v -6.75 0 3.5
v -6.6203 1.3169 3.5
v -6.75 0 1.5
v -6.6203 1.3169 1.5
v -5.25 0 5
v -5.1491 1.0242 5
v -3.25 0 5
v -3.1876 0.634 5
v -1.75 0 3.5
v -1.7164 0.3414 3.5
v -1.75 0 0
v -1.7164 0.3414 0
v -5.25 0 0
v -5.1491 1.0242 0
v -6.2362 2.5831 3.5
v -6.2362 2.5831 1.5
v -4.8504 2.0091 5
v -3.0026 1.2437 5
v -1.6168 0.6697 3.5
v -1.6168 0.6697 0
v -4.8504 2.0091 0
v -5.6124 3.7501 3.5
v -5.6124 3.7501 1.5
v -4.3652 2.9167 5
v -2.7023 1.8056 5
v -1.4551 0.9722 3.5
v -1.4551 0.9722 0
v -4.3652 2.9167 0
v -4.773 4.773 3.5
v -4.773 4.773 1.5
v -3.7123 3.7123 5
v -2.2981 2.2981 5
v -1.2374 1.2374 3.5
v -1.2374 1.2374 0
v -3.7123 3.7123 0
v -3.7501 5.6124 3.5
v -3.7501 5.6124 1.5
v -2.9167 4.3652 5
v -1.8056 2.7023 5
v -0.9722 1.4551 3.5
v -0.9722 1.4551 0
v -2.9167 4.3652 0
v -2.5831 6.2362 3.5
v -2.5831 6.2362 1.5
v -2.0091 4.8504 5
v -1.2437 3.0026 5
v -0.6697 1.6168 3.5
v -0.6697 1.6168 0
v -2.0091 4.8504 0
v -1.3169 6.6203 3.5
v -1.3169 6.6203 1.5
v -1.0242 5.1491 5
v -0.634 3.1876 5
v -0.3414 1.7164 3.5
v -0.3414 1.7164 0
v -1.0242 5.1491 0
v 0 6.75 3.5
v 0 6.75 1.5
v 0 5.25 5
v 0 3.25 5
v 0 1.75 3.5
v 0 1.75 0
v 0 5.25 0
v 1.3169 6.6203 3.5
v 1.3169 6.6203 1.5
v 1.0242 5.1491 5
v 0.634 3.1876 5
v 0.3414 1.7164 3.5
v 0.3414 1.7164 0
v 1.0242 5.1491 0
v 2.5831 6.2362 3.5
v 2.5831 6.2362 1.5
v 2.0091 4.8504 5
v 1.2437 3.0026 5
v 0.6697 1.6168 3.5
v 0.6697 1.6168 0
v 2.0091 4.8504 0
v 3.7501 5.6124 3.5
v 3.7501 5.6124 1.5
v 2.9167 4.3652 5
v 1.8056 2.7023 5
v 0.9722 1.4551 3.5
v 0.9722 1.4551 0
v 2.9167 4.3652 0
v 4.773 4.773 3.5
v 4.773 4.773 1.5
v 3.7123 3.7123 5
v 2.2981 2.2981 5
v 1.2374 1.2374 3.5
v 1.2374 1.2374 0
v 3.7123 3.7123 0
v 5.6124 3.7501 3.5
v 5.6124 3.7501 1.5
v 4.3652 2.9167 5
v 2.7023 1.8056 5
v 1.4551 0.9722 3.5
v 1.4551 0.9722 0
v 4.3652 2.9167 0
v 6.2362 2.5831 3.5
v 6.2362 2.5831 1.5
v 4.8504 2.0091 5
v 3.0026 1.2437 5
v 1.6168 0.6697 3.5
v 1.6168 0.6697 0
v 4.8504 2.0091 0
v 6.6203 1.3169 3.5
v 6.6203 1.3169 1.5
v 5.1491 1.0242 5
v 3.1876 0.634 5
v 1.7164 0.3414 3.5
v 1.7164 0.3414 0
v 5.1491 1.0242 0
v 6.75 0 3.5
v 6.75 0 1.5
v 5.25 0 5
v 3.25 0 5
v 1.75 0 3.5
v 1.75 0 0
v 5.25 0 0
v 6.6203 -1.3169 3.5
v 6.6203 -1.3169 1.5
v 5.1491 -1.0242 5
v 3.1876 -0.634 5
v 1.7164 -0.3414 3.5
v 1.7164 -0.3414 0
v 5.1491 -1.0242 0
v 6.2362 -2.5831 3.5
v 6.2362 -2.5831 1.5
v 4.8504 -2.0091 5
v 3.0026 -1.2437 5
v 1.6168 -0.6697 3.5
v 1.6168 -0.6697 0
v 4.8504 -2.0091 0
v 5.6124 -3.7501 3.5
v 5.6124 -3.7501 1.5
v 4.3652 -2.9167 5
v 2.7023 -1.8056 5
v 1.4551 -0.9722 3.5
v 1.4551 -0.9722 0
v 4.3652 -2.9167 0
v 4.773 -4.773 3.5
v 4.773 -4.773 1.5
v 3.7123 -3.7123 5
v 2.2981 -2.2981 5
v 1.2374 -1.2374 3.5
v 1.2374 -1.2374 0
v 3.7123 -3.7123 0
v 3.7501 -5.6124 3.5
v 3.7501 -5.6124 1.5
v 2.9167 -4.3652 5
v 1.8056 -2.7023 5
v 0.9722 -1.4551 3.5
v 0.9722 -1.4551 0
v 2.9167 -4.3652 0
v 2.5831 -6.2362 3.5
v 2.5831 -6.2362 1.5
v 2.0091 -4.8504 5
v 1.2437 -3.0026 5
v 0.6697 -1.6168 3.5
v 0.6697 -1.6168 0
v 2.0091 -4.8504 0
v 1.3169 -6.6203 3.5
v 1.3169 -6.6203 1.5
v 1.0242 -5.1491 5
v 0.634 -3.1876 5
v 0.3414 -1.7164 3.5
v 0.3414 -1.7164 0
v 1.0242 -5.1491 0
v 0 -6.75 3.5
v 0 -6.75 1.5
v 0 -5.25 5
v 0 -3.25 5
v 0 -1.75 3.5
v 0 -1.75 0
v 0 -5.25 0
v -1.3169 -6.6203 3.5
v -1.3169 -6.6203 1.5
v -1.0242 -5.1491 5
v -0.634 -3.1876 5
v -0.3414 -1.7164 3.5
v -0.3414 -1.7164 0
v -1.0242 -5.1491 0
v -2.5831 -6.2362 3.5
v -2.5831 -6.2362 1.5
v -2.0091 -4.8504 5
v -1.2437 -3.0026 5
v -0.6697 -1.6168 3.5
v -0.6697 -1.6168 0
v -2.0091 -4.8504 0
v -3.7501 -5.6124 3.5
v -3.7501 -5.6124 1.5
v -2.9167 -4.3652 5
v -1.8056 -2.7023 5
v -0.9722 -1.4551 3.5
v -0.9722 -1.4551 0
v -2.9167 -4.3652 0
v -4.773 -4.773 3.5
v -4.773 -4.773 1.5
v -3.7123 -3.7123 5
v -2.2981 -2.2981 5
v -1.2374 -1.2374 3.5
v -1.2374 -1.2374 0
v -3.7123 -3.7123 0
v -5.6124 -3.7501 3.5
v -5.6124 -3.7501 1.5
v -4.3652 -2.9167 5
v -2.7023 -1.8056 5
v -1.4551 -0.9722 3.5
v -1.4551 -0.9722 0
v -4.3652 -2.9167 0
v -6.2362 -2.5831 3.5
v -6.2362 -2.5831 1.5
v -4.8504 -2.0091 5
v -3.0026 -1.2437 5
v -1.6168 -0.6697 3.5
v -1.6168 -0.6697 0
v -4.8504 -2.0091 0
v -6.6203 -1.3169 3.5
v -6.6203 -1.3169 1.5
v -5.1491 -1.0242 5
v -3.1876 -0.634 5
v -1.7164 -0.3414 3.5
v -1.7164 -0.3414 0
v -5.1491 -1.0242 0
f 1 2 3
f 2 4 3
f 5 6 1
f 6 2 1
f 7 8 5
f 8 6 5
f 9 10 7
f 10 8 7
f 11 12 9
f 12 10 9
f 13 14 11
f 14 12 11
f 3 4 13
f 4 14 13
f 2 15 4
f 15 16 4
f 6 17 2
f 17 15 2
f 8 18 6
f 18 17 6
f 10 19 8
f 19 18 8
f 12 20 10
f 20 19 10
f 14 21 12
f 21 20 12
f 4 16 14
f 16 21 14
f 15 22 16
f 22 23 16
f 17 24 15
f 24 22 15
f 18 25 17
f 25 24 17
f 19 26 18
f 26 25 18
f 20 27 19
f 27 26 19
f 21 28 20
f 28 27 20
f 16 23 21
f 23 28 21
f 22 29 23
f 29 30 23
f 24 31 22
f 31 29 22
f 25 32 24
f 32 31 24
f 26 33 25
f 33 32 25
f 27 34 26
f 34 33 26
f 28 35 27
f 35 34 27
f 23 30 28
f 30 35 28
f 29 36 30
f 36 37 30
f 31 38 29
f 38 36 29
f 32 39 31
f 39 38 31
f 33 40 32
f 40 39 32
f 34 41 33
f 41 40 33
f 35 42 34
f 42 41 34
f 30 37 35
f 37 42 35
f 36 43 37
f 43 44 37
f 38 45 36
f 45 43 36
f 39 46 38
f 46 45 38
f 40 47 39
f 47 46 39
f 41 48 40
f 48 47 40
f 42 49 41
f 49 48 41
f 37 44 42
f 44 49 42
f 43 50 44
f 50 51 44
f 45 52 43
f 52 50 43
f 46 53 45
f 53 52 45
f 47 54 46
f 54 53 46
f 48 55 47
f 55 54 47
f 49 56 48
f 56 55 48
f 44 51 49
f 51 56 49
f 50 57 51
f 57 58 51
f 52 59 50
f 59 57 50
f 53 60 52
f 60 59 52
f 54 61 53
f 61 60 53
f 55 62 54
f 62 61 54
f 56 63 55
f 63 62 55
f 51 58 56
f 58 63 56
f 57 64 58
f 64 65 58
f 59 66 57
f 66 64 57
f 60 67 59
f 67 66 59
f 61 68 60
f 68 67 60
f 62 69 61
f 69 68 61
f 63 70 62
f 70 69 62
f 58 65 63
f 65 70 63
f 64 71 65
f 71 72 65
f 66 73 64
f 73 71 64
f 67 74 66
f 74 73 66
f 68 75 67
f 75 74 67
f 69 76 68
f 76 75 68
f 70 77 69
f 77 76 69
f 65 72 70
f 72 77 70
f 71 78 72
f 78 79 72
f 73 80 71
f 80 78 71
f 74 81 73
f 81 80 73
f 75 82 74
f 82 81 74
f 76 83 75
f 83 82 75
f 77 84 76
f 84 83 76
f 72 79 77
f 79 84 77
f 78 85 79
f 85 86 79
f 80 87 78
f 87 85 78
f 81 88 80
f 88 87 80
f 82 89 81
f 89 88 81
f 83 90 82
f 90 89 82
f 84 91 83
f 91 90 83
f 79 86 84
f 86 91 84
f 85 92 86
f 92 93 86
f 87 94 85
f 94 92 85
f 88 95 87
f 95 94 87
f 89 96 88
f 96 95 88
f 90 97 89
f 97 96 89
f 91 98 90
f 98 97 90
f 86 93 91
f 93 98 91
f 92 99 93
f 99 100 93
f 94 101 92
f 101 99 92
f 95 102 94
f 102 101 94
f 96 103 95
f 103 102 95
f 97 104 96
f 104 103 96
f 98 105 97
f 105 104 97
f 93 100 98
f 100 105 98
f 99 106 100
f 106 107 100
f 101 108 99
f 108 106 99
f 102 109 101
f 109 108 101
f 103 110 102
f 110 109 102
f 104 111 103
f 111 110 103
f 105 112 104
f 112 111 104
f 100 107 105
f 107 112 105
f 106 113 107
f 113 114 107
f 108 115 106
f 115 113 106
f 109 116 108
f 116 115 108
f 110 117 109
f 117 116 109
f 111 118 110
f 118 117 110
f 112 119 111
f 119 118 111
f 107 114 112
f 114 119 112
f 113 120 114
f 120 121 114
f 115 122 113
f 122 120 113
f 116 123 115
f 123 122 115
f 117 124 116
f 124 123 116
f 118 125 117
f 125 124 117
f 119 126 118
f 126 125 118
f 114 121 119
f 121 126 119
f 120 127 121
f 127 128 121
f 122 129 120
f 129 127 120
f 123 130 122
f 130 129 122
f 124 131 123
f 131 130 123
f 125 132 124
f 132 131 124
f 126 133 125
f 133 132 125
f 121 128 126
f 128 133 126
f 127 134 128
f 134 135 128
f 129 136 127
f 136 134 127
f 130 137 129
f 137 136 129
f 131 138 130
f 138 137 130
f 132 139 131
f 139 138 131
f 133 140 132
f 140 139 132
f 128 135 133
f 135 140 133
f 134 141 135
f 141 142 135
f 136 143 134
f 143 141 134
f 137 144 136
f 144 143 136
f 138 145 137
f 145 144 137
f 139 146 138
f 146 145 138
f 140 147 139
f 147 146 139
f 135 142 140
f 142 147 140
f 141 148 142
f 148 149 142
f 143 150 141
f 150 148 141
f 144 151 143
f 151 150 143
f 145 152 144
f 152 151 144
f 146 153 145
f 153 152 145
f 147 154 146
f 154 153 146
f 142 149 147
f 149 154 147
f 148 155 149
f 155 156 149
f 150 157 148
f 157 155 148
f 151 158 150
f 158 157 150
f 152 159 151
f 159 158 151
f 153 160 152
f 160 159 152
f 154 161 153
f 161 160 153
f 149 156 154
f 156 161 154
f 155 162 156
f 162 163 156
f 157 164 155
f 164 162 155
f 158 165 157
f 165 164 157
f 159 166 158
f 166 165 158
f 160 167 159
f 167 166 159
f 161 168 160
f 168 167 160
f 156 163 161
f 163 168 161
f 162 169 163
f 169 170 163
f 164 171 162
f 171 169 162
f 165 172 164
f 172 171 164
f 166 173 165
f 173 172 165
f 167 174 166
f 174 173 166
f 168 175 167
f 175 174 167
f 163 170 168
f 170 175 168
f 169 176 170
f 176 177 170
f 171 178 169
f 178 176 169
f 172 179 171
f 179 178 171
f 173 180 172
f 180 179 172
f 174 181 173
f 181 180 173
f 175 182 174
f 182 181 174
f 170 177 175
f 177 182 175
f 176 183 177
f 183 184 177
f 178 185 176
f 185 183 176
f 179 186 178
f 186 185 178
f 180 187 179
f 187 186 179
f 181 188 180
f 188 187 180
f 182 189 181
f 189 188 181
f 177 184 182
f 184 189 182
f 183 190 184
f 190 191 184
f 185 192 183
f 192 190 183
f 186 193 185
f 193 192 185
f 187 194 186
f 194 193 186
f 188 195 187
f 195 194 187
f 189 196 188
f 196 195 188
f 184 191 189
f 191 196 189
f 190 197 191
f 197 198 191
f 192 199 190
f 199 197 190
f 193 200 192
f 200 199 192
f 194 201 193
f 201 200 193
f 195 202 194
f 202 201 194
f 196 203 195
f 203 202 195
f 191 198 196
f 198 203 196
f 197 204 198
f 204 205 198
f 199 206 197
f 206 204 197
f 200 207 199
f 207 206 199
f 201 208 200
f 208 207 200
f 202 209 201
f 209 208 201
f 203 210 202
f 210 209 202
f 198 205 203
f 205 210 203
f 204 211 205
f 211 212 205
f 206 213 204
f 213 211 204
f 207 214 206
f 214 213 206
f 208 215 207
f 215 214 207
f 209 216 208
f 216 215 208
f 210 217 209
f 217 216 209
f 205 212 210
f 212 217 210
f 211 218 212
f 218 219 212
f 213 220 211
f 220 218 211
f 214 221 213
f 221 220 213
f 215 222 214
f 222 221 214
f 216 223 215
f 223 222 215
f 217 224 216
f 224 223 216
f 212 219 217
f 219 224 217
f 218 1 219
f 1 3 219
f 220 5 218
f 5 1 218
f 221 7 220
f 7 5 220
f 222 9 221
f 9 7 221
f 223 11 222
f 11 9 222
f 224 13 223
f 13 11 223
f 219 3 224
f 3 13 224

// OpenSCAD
$fn = 32;

// ----------------------------------------------------------------------
// Form washer: chamfered washer, 13.5 mm outside, 3.5 mm bore
// ----------------------------------------------------------------------

// --- parameters (mm) ---
revolve_angle = 360;      // full turn around the Z axis
profile_points = 7;       // points of the closed outline

profile = [[1.75, 0], [5.25, 0], [6.75, 1.5], [6.75, 3.5], [5.25, 5], [3.25, 5], [1.75, 3.5]];  // single closed polygon, 7 points, counter clockwise

// --- the one profile operation ---
rotate_extrude(angle = revolve_angle) polygon(points = profile);
